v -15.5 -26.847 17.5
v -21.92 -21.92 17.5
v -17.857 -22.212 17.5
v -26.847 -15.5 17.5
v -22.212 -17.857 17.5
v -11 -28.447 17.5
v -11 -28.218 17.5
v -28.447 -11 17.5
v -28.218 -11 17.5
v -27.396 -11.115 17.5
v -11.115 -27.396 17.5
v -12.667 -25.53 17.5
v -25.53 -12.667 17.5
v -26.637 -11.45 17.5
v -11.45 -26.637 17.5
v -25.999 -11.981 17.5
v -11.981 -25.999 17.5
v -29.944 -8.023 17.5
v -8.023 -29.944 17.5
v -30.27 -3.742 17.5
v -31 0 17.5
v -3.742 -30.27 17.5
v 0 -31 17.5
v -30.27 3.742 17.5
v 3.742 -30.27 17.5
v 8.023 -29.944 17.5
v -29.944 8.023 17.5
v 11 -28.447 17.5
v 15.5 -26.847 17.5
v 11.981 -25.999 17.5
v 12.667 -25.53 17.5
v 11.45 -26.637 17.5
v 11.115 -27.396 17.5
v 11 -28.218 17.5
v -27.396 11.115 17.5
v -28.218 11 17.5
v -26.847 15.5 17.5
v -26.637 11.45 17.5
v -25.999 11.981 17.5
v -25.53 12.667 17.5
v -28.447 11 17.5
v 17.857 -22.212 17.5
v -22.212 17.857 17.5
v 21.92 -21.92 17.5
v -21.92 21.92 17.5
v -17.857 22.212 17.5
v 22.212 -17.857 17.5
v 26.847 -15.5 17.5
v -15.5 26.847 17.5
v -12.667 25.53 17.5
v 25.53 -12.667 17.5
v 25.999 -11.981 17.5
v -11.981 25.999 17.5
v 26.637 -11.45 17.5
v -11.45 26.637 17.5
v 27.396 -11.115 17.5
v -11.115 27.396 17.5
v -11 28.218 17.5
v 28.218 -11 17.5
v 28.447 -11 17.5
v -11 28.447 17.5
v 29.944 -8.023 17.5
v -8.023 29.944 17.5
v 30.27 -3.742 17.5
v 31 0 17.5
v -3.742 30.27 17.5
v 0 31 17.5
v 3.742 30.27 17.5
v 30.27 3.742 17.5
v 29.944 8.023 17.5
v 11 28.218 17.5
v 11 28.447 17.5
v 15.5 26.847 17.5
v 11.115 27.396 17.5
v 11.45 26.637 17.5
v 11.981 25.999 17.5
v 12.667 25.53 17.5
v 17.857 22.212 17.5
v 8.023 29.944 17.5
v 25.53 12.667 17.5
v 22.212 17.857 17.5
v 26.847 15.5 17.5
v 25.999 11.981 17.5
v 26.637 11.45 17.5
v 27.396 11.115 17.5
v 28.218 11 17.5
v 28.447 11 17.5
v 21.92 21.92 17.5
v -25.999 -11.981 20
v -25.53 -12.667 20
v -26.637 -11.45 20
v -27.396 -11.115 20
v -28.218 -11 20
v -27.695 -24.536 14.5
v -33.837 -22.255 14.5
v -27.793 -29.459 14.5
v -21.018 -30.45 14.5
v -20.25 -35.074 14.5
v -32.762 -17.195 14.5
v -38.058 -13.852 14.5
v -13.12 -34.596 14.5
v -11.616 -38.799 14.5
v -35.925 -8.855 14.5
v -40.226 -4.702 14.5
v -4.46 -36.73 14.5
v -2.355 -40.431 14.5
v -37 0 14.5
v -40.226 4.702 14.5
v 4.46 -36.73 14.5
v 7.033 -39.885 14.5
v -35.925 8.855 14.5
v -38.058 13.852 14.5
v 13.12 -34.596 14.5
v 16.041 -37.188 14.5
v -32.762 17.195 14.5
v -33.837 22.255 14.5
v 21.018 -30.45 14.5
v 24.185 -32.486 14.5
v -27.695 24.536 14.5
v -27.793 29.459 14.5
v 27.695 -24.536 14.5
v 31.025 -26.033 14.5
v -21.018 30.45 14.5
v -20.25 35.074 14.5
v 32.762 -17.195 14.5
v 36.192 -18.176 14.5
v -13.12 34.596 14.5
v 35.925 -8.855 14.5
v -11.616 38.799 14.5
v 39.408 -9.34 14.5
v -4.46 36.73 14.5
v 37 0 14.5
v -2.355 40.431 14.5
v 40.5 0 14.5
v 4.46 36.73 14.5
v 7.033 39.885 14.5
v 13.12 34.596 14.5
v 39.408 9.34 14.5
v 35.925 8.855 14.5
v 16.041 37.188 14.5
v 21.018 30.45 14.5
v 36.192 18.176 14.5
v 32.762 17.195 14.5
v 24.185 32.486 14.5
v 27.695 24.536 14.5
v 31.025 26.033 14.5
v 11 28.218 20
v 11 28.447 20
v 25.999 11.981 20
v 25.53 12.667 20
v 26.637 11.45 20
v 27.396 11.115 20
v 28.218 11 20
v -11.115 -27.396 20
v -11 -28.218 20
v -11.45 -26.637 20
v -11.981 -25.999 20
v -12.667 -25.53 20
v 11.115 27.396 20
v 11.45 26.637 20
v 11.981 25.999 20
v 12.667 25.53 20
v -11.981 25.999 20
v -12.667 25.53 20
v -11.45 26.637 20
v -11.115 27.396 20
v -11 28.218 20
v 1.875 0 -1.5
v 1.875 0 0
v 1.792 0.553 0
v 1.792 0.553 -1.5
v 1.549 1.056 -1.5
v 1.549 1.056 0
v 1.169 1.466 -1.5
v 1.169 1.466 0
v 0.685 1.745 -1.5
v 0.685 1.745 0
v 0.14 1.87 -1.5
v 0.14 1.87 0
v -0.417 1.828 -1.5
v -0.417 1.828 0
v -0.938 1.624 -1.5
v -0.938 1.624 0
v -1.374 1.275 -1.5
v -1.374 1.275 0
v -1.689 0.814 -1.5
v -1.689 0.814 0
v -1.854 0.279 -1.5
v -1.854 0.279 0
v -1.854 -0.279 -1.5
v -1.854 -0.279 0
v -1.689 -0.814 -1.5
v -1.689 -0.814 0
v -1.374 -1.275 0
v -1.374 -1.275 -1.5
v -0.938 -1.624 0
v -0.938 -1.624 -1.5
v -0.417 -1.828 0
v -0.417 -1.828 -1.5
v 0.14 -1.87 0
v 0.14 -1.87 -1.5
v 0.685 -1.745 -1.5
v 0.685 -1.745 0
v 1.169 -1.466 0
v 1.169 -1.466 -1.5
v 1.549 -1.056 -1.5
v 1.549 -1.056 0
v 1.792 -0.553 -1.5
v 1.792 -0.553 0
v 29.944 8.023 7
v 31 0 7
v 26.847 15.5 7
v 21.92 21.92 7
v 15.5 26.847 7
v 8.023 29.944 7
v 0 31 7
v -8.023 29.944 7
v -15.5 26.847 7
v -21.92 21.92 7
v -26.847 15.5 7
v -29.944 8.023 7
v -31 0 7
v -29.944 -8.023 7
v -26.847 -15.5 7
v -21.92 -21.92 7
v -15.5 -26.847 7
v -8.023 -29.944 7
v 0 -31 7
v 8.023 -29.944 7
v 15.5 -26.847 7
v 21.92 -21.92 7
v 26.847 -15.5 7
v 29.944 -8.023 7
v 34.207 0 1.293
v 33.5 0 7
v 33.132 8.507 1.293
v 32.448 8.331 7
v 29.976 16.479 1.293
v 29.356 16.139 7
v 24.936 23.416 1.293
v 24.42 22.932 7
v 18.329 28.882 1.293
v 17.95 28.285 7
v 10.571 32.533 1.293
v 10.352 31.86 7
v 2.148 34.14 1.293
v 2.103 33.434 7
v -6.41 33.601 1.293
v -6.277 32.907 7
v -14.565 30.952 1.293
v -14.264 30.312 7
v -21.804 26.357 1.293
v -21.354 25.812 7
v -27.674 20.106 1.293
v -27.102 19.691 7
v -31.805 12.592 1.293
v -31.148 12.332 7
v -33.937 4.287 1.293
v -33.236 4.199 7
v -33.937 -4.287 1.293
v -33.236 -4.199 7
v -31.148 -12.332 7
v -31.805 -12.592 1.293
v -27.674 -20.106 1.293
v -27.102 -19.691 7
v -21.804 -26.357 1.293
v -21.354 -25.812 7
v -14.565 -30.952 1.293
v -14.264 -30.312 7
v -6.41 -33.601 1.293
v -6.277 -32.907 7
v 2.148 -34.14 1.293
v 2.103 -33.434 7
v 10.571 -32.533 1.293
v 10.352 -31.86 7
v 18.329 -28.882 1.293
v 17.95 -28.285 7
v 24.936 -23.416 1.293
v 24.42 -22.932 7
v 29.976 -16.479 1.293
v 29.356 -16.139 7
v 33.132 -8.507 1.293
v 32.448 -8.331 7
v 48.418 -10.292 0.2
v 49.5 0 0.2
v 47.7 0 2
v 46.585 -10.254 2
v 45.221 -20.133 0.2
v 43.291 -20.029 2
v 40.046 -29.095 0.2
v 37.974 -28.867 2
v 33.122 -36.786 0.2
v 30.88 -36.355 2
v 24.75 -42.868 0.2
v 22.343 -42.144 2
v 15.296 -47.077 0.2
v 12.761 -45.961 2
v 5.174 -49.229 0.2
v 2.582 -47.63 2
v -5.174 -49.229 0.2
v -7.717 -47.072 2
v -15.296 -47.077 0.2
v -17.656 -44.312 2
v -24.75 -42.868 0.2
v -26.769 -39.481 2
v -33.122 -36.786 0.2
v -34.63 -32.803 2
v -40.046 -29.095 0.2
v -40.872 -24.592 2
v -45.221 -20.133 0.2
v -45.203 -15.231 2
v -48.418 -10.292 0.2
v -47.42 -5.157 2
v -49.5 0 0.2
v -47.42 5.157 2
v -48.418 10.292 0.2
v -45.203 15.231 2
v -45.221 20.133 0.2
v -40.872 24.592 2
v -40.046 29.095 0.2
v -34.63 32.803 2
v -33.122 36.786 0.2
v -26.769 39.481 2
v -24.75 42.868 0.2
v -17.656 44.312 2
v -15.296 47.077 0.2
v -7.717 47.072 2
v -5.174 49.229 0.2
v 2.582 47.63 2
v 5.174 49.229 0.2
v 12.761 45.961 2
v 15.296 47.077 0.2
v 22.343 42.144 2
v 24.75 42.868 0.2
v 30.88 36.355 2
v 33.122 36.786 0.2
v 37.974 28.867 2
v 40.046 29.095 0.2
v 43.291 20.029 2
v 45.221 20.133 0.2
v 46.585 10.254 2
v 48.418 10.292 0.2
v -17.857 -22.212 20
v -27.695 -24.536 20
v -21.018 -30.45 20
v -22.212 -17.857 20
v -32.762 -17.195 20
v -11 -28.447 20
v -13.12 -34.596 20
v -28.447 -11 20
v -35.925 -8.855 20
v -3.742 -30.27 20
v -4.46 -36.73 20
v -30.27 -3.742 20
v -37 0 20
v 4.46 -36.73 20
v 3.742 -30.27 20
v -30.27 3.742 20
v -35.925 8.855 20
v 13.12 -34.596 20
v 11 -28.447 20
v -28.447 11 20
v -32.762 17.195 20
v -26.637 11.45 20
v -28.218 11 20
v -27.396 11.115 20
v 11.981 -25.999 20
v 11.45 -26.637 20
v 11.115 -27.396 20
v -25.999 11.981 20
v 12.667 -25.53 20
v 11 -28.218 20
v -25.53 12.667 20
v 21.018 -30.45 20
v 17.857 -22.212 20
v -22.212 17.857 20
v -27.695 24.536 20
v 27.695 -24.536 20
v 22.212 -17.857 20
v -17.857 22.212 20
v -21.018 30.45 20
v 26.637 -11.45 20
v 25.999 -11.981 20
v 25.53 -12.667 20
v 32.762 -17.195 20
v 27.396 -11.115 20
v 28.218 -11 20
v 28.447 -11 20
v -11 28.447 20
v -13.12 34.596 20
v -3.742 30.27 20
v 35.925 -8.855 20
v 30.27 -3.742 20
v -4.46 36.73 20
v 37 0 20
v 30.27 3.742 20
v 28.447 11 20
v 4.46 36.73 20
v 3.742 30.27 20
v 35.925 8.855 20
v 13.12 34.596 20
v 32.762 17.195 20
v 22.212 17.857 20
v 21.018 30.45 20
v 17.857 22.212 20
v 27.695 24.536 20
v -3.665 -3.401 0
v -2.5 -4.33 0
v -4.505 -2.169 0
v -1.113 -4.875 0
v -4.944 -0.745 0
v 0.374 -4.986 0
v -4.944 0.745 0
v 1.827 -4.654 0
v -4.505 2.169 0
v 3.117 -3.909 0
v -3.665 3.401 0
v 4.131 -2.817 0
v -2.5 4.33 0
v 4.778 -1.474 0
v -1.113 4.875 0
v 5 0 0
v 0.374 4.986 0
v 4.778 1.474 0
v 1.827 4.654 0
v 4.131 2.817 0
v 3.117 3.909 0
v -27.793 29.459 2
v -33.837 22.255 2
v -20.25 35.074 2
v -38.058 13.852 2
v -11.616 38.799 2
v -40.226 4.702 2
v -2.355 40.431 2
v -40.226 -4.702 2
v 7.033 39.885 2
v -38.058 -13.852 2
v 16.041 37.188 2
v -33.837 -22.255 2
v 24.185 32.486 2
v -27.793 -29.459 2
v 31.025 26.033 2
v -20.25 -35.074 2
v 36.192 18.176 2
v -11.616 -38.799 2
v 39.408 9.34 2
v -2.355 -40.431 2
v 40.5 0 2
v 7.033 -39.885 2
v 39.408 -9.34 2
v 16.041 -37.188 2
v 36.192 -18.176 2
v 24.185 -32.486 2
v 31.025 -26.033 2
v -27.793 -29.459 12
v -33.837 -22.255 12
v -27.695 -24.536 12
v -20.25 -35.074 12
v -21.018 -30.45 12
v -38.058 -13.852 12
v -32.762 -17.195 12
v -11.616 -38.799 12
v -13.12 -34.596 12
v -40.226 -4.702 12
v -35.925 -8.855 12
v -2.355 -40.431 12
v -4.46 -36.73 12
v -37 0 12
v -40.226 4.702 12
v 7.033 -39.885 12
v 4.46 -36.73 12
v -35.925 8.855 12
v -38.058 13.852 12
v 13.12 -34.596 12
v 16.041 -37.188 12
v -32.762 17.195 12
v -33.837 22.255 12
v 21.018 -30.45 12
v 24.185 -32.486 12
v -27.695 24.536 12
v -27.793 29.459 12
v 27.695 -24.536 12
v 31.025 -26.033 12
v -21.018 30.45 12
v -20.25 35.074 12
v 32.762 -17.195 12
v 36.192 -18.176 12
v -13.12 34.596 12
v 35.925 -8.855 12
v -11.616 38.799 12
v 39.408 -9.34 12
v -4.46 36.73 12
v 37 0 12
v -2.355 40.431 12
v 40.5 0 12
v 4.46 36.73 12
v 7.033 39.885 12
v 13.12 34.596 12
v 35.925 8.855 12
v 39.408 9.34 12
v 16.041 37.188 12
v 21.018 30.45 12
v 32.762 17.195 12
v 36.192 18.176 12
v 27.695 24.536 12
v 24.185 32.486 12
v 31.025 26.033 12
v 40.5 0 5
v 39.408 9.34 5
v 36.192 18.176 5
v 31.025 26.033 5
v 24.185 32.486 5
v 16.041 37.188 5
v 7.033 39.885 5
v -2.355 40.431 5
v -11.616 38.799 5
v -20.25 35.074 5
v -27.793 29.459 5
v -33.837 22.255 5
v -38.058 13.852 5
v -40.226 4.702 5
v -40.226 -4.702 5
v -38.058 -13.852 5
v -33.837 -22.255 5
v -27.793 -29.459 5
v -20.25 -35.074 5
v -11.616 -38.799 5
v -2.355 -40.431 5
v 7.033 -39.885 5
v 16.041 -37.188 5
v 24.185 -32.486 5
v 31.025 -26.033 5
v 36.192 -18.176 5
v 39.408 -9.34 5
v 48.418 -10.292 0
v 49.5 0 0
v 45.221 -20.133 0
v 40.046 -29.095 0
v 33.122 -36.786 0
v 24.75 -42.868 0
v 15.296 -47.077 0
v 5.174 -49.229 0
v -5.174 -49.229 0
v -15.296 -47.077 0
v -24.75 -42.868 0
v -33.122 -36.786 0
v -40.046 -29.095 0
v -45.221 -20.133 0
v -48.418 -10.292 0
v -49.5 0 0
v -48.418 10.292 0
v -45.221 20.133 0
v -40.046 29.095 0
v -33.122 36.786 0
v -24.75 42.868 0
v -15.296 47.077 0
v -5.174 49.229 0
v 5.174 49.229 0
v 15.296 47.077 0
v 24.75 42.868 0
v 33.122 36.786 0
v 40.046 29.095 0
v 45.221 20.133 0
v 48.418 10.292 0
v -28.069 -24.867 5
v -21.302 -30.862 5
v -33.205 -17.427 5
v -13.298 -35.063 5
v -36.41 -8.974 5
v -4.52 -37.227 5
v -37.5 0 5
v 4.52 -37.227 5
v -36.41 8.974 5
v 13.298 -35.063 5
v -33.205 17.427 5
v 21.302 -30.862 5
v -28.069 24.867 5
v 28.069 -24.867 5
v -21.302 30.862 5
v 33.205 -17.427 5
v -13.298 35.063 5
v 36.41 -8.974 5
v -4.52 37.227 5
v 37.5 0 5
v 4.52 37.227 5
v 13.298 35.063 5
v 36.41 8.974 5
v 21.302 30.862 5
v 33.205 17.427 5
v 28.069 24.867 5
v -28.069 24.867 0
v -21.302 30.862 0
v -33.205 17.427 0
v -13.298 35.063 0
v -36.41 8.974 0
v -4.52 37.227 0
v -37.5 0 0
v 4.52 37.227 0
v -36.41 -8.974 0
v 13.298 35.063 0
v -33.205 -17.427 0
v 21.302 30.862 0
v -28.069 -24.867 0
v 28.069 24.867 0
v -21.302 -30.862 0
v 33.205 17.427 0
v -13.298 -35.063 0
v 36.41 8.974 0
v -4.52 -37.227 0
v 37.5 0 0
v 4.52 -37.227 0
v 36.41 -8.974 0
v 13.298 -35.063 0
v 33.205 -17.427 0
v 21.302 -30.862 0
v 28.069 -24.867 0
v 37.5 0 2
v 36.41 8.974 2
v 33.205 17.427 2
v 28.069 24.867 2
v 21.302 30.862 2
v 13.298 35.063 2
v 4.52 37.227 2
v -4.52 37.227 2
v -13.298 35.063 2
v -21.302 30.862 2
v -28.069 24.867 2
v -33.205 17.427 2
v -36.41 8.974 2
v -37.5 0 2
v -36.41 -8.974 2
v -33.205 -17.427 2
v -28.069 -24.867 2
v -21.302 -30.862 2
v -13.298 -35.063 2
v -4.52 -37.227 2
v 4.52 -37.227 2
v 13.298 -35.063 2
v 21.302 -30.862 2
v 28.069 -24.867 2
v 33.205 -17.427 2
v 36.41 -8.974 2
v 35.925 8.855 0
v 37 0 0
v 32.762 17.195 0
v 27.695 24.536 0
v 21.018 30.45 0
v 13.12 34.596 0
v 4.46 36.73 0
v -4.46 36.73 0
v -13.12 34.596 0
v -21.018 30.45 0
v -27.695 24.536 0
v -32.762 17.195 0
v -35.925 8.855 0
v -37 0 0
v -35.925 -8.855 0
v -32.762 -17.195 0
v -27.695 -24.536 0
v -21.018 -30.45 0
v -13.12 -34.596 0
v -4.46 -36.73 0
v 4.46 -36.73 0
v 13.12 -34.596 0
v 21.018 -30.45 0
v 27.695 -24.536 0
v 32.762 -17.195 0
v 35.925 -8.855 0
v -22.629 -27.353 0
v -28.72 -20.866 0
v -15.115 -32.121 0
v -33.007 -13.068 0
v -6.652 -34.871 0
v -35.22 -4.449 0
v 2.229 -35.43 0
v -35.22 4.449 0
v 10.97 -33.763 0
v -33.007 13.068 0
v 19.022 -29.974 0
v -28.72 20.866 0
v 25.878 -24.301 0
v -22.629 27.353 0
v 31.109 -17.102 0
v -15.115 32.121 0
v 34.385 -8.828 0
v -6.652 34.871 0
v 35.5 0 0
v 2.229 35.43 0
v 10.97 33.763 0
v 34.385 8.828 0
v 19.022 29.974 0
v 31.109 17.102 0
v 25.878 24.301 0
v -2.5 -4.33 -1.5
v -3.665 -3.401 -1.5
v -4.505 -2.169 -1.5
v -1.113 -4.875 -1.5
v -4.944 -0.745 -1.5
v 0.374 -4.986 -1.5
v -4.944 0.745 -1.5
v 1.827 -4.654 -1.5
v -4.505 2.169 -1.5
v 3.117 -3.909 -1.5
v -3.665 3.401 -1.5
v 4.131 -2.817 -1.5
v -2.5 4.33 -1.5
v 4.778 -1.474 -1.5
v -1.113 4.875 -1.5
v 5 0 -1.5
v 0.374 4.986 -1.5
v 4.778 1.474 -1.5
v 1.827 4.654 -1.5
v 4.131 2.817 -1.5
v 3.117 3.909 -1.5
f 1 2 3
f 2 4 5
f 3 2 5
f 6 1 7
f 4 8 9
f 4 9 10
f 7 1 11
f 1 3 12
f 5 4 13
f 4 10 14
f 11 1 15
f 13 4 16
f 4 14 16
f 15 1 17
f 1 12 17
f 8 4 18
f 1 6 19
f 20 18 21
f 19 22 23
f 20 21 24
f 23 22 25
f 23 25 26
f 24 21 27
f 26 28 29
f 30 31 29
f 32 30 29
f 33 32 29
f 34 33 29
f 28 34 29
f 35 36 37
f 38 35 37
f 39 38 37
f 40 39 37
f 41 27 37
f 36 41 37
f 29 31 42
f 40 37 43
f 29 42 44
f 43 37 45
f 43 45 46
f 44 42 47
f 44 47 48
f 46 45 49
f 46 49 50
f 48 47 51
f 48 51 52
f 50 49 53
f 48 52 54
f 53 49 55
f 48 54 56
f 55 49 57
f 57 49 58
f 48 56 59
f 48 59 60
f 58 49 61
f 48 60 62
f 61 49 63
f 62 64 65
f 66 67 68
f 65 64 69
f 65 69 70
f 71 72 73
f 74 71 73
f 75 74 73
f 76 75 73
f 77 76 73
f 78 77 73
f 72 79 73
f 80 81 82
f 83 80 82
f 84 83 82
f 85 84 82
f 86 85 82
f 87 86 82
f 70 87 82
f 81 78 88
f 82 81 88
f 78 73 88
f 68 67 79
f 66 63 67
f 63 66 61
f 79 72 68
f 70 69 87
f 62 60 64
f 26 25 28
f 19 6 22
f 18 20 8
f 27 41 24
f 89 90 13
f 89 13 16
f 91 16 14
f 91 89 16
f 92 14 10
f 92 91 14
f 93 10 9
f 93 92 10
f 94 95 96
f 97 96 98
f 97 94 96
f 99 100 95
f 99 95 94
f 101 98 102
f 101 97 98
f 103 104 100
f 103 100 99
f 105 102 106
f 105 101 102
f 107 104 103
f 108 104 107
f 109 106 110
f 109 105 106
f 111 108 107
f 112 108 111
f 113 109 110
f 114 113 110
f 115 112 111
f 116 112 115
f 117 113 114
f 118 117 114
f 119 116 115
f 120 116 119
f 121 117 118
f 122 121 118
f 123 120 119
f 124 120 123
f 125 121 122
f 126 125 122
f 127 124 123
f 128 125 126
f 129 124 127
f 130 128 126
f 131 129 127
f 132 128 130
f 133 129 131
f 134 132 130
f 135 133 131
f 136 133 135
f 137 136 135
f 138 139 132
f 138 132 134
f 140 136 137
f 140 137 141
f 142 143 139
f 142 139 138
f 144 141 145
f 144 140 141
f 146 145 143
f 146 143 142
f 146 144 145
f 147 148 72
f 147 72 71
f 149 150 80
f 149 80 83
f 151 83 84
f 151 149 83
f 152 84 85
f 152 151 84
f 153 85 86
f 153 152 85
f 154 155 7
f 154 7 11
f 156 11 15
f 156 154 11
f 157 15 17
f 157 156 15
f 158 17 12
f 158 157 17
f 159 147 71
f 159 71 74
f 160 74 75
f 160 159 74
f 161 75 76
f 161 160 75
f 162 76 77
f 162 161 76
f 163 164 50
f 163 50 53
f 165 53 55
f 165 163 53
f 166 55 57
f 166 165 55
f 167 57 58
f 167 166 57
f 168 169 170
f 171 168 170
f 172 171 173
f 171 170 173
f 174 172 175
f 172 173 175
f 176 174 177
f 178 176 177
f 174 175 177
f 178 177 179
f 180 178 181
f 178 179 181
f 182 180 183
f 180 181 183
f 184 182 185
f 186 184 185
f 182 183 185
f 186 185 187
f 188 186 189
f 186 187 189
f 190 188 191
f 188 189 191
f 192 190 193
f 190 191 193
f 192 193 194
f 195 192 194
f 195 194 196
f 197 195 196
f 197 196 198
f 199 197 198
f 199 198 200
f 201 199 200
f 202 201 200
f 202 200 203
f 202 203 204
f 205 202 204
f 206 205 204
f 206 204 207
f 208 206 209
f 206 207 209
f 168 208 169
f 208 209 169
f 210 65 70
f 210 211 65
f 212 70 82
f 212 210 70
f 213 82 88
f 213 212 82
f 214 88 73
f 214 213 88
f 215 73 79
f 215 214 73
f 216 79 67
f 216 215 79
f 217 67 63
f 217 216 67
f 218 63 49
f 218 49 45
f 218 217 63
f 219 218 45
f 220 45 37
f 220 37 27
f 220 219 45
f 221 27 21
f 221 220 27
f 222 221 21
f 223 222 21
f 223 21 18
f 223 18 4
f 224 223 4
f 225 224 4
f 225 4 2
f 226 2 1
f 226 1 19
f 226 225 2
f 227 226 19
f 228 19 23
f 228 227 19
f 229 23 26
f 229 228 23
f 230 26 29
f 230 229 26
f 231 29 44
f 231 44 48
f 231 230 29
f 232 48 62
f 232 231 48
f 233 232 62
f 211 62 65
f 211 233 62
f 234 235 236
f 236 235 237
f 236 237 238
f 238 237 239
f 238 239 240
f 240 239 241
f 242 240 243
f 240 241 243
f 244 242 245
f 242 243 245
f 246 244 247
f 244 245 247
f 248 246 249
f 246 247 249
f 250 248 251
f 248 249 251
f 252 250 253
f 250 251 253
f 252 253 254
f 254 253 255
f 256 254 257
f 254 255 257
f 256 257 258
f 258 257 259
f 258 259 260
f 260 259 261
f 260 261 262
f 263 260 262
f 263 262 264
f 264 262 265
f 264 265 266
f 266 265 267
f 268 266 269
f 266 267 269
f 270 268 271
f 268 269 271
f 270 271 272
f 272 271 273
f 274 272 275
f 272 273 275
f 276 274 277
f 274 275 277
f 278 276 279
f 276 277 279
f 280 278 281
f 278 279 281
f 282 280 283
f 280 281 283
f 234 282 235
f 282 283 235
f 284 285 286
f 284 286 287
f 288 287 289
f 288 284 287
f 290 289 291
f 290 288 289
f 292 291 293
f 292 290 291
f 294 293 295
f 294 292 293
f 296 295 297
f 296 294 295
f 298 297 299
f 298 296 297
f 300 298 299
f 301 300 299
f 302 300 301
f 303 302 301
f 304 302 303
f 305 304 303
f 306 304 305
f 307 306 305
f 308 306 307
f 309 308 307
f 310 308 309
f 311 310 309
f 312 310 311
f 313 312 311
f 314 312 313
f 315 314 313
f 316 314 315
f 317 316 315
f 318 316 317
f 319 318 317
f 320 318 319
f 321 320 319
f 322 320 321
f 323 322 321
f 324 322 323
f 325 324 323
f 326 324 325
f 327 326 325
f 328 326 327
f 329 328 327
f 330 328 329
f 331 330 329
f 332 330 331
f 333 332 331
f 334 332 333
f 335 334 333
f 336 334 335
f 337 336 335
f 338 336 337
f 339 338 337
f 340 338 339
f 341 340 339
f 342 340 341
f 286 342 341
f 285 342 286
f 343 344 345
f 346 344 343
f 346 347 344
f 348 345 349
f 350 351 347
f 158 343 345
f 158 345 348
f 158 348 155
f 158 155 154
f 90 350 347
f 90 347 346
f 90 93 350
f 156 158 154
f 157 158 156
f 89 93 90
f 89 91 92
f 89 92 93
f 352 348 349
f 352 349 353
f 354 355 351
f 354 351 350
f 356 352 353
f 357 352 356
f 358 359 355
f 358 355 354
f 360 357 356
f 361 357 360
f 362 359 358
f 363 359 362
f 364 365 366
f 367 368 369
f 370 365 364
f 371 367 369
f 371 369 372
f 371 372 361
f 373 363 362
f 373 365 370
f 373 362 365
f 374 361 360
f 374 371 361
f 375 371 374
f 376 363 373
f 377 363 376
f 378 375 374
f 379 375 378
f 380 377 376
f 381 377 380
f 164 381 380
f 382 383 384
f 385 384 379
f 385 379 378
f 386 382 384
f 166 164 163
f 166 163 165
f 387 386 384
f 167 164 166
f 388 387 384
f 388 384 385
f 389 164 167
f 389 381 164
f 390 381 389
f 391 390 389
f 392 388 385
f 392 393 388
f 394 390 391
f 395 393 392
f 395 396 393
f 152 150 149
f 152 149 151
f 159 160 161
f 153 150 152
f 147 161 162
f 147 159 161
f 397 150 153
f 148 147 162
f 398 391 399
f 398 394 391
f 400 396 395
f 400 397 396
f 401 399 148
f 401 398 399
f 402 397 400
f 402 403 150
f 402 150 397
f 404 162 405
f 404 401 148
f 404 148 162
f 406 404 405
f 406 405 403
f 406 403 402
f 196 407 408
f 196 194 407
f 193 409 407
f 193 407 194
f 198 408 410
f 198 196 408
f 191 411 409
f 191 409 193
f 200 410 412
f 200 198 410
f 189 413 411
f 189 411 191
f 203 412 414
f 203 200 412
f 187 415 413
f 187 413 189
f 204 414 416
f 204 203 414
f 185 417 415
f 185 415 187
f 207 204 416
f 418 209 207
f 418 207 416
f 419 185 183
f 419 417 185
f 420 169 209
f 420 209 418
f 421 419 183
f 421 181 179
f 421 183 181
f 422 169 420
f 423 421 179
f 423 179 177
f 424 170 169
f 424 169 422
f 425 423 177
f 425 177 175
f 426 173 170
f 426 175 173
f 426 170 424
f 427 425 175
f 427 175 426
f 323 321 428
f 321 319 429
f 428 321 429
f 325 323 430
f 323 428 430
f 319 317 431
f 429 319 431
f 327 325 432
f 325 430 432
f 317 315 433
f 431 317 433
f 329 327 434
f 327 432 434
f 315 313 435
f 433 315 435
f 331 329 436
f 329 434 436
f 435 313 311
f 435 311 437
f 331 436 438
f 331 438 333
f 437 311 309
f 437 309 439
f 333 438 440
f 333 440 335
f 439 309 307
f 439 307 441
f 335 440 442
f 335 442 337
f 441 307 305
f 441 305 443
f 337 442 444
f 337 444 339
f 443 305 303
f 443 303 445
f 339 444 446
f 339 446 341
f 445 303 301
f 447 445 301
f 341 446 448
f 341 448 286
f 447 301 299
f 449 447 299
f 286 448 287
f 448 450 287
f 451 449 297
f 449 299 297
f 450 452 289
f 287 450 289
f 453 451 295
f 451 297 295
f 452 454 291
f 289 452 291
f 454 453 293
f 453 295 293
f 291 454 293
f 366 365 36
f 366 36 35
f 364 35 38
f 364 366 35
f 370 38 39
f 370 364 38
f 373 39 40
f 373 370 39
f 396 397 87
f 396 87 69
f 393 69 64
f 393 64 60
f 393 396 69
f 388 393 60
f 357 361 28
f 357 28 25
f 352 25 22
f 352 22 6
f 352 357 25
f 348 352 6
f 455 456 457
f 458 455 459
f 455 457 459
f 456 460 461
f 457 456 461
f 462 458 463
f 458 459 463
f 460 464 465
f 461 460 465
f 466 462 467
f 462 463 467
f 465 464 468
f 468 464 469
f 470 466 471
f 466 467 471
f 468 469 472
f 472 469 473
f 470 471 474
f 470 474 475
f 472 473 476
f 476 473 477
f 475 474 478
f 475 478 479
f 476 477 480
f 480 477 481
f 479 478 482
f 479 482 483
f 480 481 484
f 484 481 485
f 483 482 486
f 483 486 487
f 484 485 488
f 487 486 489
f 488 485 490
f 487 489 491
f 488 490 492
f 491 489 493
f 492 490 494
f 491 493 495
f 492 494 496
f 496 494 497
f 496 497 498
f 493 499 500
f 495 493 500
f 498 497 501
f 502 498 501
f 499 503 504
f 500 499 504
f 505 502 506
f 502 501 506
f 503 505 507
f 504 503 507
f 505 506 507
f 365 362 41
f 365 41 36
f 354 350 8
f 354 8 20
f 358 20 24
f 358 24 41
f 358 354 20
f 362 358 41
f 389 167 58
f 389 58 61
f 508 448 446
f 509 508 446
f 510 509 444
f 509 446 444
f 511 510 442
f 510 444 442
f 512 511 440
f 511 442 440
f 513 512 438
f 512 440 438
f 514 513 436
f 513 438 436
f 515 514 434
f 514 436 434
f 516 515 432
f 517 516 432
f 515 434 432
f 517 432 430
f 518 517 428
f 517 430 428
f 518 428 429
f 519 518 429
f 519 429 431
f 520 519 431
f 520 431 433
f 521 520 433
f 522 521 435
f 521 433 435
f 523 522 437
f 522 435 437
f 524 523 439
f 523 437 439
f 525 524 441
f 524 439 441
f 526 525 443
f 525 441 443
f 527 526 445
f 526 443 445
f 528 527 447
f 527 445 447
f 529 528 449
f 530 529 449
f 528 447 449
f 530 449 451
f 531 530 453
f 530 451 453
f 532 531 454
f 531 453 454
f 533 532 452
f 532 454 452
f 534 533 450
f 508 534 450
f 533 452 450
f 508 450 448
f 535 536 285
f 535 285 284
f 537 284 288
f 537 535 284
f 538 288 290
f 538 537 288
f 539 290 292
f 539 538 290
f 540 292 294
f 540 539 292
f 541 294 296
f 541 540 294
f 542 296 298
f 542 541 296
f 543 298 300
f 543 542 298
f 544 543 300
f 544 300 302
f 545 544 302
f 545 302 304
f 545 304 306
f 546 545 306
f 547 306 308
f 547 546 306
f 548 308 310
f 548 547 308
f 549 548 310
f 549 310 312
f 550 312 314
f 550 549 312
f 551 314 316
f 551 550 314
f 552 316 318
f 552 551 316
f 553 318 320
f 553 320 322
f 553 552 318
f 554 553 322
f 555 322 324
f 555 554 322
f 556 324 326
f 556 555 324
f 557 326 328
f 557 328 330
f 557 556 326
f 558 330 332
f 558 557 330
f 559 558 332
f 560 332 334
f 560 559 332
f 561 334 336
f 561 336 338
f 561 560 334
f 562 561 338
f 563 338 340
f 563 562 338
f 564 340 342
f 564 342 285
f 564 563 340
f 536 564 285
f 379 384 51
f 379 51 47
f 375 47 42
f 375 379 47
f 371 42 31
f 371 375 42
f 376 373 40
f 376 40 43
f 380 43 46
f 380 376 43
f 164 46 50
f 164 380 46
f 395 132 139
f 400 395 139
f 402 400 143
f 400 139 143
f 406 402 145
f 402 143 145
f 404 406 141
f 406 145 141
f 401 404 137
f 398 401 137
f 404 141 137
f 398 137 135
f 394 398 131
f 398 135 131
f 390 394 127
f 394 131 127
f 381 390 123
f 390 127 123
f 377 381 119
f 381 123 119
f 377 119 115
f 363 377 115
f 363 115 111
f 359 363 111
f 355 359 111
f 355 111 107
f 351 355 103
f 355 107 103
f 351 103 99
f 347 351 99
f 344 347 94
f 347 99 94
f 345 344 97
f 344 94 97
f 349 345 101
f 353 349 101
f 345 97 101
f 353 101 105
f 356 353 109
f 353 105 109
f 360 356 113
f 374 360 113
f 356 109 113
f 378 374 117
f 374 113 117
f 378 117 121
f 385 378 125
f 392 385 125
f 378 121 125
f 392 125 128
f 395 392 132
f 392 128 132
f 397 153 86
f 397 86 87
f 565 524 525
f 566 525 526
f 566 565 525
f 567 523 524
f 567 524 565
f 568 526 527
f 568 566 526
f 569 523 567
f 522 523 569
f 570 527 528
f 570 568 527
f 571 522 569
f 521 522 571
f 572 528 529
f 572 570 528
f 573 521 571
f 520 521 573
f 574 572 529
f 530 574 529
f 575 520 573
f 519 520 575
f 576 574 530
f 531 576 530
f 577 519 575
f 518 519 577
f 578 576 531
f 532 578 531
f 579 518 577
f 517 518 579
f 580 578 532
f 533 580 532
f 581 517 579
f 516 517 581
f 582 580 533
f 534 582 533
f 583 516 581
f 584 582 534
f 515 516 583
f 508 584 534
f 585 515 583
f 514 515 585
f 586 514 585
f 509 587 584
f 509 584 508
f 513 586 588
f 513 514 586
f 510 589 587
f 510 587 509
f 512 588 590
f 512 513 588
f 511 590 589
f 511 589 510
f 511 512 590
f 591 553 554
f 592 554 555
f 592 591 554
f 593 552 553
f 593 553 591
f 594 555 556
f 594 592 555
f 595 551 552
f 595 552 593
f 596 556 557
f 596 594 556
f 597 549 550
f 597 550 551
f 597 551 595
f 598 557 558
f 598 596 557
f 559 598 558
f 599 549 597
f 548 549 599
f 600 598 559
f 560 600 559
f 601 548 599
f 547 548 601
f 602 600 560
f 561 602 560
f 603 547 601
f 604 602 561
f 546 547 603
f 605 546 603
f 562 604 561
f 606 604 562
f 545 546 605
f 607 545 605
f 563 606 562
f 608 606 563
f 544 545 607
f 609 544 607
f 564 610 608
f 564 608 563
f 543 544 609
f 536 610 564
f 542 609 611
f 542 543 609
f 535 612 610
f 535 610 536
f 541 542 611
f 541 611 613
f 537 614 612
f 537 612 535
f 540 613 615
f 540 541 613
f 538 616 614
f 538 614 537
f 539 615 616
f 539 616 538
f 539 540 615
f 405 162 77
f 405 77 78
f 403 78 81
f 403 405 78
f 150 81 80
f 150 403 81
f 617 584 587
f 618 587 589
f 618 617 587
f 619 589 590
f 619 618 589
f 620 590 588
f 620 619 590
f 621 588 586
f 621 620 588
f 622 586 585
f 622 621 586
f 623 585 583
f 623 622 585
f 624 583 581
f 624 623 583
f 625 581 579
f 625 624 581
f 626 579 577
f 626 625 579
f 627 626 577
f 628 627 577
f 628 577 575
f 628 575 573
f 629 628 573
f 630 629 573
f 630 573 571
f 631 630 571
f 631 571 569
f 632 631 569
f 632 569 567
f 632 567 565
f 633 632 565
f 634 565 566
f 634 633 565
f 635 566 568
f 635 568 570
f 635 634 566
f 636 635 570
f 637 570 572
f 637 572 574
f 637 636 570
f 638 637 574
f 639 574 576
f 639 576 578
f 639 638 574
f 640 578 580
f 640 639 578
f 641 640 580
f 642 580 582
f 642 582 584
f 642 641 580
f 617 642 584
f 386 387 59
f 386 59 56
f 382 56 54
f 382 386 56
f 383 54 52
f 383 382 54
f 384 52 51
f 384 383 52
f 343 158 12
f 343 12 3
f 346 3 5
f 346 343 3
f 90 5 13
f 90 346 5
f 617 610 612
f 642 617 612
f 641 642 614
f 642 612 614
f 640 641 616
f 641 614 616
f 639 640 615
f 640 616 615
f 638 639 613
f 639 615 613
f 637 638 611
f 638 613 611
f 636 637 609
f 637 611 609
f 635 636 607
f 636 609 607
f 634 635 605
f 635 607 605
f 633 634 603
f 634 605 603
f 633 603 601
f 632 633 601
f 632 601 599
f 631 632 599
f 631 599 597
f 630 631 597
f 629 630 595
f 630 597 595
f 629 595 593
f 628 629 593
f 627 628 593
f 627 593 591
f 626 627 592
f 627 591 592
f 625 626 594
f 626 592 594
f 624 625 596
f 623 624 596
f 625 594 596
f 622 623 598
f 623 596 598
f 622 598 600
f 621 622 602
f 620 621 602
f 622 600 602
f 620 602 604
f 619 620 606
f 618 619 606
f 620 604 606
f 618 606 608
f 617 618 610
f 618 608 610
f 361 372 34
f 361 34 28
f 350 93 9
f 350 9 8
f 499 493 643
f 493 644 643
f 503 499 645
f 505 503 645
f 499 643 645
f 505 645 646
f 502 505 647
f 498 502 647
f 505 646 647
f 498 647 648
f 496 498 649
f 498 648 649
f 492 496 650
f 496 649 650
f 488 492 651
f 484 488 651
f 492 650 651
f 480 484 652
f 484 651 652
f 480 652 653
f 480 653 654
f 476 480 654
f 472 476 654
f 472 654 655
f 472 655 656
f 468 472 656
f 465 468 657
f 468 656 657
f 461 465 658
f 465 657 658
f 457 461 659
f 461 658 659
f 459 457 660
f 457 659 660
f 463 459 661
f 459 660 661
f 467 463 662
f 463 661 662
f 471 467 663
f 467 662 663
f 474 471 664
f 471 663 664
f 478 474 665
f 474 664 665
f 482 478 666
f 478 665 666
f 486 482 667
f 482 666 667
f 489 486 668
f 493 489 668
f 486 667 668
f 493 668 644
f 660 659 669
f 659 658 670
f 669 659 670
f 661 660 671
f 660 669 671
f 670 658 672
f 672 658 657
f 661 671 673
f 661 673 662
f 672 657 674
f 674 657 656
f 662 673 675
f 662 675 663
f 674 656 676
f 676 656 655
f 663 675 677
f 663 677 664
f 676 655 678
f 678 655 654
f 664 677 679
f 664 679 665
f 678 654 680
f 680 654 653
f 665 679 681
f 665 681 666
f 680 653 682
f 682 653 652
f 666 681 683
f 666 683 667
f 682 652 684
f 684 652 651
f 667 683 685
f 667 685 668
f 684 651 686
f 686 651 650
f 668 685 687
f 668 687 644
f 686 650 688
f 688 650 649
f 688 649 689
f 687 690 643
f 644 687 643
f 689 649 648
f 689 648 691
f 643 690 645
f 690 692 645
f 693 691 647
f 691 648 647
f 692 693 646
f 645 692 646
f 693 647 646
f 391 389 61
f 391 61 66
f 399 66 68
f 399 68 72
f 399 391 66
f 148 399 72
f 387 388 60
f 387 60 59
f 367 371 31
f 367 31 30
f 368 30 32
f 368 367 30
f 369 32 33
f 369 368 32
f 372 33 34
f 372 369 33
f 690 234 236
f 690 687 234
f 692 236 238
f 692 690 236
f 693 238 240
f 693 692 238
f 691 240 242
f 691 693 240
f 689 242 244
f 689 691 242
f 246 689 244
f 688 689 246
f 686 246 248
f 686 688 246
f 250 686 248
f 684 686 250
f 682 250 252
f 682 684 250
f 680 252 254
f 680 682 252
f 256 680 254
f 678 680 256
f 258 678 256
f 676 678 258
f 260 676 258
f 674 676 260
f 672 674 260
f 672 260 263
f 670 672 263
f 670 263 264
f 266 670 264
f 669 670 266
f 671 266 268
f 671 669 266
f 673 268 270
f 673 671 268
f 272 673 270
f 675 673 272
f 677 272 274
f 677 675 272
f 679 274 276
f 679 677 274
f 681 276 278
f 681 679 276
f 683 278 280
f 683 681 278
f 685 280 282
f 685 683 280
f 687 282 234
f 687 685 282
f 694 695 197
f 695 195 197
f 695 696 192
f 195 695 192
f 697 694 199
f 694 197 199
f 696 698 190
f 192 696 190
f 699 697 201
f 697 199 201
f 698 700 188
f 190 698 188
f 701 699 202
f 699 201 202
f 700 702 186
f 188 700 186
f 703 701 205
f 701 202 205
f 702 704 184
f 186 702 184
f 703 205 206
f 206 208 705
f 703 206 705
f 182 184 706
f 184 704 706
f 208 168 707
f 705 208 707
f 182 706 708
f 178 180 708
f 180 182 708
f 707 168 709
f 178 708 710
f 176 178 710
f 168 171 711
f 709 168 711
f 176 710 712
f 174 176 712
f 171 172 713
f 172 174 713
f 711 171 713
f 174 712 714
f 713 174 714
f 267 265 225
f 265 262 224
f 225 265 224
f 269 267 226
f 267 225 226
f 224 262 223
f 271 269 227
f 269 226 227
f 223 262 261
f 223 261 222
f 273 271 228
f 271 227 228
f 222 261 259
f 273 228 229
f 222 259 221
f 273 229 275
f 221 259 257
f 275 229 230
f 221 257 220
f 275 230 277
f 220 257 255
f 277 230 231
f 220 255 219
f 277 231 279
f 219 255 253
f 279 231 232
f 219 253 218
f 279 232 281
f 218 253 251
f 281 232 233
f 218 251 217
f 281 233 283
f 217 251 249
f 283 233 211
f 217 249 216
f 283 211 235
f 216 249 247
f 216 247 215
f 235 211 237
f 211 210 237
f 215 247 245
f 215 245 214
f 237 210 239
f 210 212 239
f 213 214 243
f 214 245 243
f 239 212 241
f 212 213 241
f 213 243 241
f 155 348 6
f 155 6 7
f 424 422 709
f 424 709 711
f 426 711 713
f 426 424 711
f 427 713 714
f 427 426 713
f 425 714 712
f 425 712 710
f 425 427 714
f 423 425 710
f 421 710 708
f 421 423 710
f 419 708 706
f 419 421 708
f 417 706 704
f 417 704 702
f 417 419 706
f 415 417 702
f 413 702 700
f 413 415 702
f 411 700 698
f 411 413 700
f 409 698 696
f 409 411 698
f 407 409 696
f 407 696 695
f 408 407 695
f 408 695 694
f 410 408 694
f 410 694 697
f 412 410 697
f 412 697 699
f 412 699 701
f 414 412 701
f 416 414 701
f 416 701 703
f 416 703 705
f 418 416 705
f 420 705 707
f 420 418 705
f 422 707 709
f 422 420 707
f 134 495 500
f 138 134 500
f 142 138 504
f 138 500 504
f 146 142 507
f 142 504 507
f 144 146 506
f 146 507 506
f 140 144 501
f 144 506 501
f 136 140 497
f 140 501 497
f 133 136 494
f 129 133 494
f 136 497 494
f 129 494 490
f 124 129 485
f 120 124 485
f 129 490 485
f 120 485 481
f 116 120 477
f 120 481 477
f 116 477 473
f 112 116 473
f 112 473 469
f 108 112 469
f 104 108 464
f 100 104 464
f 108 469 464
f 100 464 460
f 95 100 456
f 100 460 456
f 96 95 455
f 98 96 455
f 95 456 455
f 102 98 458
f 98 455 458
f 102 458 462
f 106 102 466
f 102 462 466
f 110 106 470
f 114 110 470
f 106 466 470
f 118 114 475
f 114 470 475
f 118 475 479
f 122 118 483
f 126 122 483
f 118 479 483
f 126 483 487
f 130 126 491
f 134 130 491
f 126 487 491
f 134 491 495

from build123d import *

# Parameters (mm, degrees)
F0_R      = 37
F0_R_2    = 33.5
F1_DEPTH  = 7
F2_R      = 37
F2_R_2    = 33.5
F2_R_3    = 31
F3_DEPTH  = 5
F4_R      = 40.5
F4_R_2    = 37
F4_R_3    = 31
F5_DEPTH  = 2.5
F6_R      = 37
F6_R_2    = 31
F7_DEPTH  = 5.5
F8_R      = 31
F9_DEPTH  = 2.5
F10_SIZE  = 2
F11_R     = 5
F11_R_2   = 1.875
F12_DEPTH = 1.5
F13_R     = 49.5
F13_R_2   = 37.5
F14_DEPTH = 2
F15_R     = 40.5
F15_R_2   = 37.5
F16_DEPTH = 3
F17_SIZE  = 1.8


# Not quite as in the source:
# - a fillet or chamfer that OpenCascade refuses, or shapes differently, is made with other operations: its cross-section is extruded or revolved along the edge and cut away or added


with BuildPart() as f1:
    # F0 (on Top) → F1 (new body)
    with BuildSketch(Plane.XY):
        Circle(F0_R)
        Circle(F0_R_2, mode=Mode.SUBTRACT)
    extrude(amount=F1_DEPTH)

    # F2 (on face) → F3 (join)
    with BuildSketch(Plane.XY.offset(7)):
        Circle(F2_R)
        Circle(F2_R_2, mode=Mode.SUBTRACT)
        Circle(F2_R_2)
        Circle(F2_R_3, mode=Mode.SUBTRACT)
    extrude(amount=F3_DEPTH)

    # F4 (on face) → F5 (join)
    with BuildSketch(Plane.XY.offset(12)):
        Circle(F4_R)
        Circle(F4_R_2, mode=Mode.SUBTRACT)
        Circle(F4_R_2)
        Circle(F4_R_3, mode=Mode.SUBTRACT)
    extrude(amount=F5_DEPTH)

    # F6 (on face) → F7 (join)
    with BuildSketch(Plane.XY.offset(14.5)):
        Circle(F6_R)
        Circle(F6_R_2, mode=Mode.SUBTRACT)
    extrude(amount=F7_DEPTH)

    # F8 (on face) → F9 (join)
    with BuildSketch(Plane.XY.offset(20)):
        Circle(F8_R)
        with BuildLine():
            ThreePointArc((-25.5304828696, 12.6666666667), (-20.1525432638, 20.1525432638), (-12.6666666667, 25.5304828696))
            ThreePointArc((-12.6666666667, 25.5304828696), (-11.4504902432, 26.636763289), (-11, 28.217902119))
            Line((-11, 28.217902119), (-11, 28.4473197331))
            ThreePointArc((-11, 28.4473197331), (0, 30.5), (11, 28.4473197331))
            Line((11, 28.4473197331), (11, 28.217902119))
            ThreePointArc((11, 28.217902119), (11.4504902432, 26.636763289), (12.6666666667, 25.5304828696))
            ThreePointArc((12.6666666667, 25.5304828696), (20.1525432638, 20.1525432638), (25.5304828696, 12.6666666667))
            ThreePointArc((25.5304828696, 12.6666666667), (26.636763289, 11.4504902432), (28.217902119, 11))
            Line((28.217902119, 11), (28.4473197331, 11))
            ThreePointArc((28.4473197331, 11), (30.5, 0), (28.4473197331, -11))
            Line((28.4473197331, -11), (28.217902119, -11))
            ThreePointArc((28.217902119, -11), (26.636763289, -11.4504902432), (25.5304828696, -12.6666666667))
            ThreePointArc((25.5304828696, -12.6666666667), (20.1525432638, -20.1525432638), (12.6666666667, -25.5304828696))
            ThreePointArc((12.6666666667, -25.5304828696), (11.4504902432, -26.636763289), (11, -28.217902119))
            Line((11, -28.217902119), (11, -28.4473197331))
            ThreePointArc((11, -28.4473197331), (0, -30.5), (-11, -28.4473197331))
            Line((-11, -28.4473197331), (-11, -28.217902119))
            ThreePointArc((-11, -28.217902119), (-11.4504902432, -26.636763289), (-12.6666666667, -25.5304828696))
            ThreePointArc((-12.6666666667, -25.5304828696), (-20.1525432638, -20.1525432638), (-25.5304828696, -12.6666666667))
            ThreePointArc((-25.5304828696, -12.6666666667), (-26.636763289, -11.4504902432), (-28.217902119, -11))
            Line((-28.217902119, -11), (-28.4473197331, -11))
            ThreePointArc((-28.4473197331, -11), (-30.5, 0), (-28.4473197331, 11))
            Line((-28.4473197331, 11), (-28.217902119, 11))
            ThreePointArc((-28.217902119, 11), (-26.636763289, 11.4504902432), (-25.5304828696, 12.6666666667))
        make_face(mode=Mode.SUBTRACT)
    extrude(amount=-F9_DEPTH)

    # F10
    f10_edges = [f1.edges().sort_by_distance(p)[0] for p in [
        (-33.5, 0, 0),
    ]]
    chamfer(f10_edges, length=F10_SIZE)

    # F18: chamfer of 5 x 1 on 1 edges, made by hand


with BuildPart() as f12:
    # F11 (on Top) → F12 (new body)
    with BuildSketch(Plane.XY):
        Circle(F11_R)
        Circle(F11_R_2, mode=Mode.SUBTRACT)
    extrude(amount=-F12_DEPTH)


with BuildPart() as f14:
    # F13 (on face) → F14 (new body)
    with BuildSketch(Plane(origin=(0, 0, 0), x_dir=(1, 0, 0), z_dir=(0, 0, -1))):
        Circle(F13_R)
        Circle(F13_R_2, mode=Mode.SUBTRACT)
    extrude(amount=-F14_DEPTH)

    # F15 (on face) → F16 (join)
    with BuildSketch(Plane.XY.offset(2)):
        Circle(F15_R)
        Circle(F15_R_2, mode=Mode.SUBTRACT)
    extrude(amount=F16_DEPTH)

    # F17
    f17_edges = [f14.edges().sort_by_distance(p)[0] for p in [
        (-49.5, 0, 2),
    ]]
    chamfer(f17_edges, length=F17_SIZE)


with BuildPart() as f18_tool2:
    # F18_s3 → F18_t4 (revolve)
    with BuildSketch(Plane.XZ):
        Polygon((34.2071067812, 1.2928932188), (33.5, 7), (33.5, 2), align=None)
    revolve(axis=Axis((0, 0, 2), (0, 0, 1)))

    split(bisect_by=Plane.XY.offset(7), keep=Keep.BOTTOM)


with BuildPart() as f1_1:
    add(f1.part)

    # F18_t1: cut F18_tool2
    add(f18_tool2.part, mode=Mode.SUBTRACT)


solid = Compound([f12.part, f14.part, f1_1.part])
